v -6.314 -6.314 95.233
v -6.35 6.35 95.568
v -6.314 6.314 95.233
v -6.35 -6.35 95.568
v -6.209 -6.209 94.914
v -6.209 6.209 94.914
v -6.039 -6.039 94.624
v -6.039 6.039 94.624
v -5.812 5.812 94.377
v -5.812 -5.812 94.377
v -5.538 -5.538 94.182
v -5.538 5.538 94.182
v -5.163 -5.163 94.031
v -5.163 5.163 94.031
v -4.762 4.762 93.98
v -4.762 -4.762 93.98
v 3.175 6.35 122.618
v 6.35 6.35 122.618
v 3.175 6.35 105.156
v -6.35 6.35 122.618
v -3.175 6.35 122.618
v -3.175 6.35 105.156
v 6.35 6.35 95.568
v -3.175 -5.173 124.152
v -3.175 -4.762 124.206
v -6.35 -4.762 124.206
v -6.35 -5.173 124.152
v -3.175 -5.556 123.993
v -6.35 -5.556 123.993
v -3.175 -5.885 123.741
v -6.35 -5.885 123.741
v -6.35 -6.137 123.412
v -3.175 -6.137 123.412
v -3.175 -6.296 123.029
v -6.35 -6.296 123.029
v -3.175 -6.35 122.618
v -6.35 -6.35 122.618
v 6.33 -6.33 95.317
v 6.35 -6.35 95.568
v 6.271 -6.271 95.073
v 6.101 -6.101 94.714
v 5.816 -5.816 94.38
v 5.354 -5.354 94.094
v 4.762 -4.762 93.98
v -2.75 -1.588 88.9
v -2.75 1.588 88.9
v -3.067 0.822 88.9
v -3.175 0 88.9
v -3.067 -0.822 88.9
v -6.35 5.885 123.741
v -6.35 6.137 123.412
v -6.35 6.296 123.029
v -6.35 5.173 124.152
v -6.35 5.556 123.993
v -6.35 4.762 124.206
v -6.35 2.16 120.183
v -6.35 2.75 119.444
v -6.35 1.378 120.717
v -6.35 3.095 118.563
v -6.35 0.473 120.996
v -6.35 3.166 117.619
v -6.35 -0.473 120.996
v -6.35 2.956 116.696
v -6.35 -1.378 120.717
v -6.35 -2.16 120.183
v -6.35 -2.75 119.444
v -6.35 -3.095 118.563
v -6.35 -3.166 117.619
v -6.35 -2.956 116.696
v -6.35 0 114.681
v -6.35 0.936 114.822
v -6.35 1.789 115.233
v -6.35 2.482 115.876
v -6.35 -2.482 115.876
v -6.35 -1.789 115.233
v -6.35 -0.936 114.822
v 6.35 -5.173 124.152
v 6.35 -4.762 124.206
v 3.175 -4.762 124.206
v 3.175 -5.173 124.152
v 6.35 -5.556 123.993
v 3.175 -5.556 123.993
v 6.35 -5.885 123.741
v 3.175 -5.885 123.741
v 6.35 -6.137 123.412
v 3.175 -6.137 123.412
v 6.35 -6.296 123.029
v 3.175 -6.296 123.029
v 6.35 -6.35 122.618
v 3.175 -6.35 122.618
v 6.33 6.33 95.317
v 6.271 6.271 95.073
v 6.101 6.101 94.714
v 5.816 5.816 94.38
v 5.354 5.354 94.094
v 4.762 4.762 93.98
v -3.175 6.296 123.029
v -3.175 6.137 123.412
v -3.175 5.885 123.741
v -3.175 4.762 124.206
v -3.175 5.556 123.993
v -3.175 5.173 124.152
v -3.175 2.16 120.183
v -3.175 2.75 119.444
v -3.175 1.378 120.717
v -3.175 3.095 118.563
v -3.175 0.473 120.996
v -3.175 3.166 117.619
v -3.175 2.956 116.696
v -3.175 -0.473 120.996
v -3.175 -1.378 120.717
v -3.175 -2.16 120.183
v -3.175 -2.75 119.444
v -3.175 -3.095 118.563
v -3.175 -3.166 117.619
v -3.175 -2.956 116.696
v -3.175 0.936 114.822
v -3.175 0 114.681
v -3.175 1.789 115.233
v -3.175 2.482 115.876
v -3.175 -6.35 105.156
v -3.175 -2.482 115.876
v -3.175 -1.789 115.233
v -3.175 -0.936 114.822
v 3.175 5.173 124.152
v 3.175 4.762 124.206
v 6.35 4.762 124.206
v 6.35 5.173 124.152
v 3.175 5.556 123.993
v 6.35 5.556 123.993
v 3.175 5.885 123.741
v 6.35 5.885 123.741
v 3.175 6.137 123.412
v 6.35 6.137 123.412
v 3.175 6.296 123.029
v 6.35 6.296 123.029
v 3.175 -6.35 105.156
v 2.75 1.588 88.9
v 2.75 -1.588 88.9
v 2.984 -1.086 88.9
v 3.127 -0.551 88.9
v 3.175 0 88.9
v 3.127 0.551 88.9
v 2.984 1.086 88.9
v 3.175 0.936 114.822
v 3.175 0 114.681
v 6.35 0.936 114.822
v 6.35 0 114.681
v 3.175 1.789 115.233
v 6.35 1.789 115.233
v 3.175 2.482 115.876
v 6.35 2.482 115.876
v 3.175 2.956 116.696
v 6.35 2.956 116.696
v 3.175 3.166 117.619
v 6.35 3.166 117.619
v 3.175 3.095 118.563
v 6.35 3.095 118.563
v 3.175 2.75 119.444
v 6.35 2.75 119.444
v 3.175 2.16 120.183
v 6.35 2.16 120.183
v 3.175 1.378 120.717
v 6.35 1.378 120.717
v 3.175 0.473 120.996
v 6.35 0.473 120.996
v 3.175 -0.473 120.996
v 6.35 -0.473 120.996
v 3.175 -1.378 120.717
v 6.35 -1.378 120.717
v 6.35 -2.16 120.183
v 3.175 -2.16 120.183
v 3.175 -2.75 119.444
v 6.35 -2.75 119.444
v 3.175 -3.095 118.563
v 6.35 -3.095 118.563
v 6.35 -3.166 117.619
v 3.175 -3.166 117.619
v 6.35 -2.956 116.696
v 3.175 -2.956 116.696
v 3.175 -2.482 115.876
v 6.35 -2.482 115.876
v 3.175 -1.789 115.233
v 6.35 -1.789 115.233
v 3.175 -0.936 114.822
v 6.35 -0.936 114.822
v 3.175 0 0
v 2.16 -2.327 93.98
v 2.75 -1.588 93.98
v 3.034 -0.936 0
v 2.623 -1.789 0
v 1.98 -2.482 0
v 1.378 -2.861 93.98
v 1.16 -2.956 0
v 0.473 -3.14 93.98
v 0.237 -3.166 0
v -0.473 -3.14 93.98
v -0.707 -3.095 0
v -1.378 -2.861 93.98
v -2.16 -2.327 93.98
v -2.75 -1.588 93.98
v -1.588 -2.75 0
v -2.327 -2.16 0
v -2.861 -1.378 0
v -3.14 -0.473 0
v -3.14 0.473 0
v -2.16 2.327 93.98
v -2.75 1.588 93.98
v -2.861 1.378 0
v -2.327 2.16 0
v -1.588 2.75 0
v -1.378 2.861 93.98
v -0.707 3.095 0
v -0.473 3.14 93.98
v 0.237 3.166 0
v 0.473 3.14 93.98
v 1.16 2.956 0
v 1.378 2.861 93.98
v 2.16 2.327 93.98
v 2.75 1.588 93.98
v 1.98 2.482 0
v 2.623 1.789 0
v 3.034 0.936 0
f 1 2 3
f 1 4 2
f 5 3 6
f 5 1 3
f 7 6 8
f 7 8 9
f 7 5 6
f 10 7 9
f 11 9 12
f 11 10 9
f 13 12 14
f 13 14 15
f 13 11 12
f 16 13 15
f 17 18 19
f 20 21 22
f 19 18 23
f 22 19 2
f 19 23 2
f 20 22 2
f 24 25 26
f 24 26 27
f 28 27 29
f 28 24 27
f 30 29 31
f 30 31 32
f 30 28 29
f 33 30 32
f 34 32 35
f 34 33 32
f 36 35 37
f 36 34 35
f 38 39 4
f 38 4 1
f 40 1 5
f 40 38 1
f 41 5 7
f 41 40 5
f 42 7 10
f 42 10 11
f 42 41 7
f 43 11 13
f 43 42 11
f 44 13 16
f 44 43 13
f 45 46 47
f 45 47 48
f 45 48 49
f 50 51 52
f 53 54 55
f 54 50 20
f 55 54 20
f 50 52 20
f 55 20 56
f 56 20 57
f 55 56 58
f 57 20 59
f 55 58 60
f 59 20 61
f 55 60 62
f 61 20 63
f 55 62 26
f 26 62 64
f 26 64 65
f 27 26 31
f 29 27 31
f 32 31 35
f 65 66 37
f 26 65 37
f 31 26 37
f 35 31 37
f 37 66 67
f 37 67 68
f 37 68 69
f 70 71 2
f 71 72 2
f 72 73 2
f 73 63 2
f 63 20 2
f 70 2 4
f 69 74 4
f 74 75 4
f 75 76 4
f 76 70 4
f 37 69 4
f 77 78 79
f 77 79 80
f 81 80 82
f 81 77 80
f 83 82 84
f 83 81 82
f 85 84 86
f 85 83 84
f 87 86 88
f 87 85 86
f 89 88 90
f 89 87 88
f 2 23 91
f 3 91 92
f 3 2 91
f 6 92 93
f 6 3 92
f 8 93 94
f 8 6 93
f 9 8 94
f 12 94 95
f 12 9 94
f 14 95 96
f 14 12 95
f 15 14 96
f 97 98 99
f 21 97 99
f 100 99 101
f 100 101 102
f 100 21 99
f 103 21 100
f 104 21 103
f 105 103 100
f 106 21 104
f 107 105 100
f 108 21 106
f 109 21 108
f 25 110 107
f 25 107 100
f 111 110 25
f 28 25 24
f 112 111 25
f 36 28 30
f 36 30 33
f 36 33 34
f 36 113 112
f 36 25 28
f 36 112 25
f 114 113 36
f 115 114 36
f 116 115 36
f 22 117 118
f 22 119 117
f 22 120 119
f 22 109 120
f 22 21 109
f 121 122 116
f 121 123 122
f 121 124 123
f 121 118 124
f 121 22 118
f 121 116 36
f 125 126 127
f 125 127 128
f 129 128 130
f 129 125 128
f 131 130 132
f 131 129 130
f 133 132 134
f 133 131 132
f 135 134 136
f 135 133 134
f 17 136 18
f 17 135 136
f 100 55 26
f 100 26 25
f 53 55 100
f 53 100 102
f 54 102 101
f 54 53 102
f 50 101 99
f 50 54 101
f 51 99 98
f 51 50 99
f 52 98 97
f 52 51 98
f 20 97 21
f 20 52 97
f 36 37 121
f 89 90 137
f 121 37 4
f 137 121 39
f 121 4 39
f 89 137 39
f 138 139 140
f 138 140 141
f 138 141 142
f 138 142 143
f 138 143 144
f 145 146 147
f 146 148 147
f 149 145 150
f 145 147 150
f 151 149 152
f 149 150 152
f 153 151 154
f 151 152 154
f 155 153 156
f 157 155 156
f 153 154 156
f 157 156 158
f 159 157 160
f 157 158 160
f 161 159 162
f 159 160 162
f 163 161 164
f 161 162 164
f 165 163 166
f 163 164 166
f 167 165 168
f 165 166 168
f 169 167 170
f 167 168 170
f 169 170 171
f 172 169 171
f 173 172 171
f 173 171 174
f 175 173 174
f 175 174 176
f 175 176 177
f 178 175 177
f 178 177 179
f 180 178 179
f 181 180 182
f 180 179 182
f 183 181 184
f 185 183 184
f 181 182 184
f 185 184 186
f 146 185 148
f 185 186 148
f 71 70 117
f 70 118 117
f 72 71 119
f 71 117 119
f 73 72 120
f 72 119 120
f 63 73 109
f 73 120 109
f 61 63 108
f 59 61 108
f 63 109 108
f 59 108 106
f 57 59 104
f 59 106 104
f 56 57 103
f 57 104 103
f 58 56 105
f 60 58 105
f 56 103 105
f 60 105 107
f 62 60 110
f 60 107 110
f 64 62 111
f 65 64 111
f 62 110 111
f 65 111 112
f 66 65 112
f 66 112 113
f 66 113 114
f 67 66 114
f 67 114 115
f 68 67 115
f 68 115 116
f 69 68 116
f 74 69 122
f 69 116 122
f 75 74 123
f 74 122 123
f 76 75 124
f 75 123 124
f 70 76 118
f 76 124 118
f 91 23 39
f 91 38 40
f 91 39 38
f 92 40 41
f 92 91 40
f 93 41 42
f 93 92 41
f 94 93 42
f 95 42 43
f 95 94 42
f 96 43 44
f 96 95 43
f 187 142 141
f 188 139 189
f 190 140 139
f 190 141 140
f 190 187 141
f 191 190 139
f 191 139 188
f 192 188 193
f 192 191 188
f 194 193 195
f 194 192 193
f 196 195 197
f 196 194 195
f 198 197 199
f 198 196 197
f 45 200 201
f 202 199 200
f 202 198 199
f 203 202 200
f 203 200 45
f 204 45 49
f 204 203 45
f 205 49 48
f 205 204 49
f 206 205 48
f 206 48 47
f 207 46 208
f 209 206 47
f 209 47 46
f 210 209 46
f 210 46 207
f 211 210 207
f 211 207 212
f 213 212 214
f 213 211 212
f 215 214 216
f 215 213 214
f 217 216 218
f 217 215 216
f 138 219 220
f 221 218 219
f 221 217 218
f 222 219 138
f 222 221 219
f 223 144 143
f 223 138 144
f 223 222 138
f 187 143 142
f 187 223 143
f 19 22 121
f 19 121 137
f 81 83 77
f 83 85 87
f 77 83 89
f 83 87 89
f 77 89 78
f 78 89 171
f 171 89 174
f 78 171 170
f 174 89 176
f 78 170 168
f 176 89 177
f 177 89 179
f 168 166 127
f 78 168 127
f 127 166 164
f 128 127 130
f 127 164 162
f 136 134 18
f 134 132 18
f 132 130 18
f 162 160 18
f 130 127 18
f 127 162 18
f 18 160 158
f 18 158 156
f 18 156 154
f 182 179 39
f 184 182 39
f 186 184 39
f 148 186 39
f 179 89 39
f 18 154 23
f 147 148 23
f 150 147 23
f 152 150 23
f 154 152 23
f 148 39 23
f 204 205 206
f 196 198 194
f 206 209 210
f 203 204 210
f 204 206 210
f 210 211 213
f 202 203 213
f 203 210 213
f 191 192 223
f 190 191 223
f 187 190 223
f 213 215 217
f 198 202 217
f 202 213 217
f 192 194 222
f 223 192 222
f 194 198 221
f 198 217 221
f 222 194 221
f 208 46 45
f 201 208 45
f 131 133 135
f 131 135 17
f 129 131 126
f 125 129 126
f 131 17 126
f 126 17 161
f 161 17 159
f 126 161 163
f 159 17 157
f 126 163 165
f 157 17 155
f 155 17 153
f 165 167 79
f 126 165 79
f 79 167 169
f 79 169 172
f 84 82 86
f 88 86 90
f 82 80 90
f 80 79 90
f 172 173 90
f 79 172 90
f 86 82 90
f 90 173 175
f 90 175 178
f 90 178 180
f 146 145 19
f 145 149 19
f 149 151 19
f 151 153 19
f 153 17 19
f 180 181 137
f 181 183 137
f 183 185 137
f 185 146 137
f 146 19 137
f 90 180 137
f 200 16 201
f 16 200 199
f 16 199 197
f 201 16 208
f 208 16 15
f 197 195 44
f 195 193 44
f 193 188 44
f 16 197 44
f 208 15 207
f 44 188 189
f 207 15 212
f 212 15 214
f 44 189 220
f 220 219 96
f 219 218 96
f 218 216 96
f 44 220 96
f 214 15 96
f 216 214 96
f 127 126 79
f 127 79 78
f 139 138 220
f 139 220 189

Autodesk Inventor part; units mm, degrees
ref_plane "YZ Plane" through (0, 0, 0) normal (1, 0, 0) x (0, 1, 0)
ref_plane "XZ Plane" through (0, 0, 0) normal (0, 1, 0) x (-1, 0, 0)
ref_plane "XY Plane" through (0, 0, 0) normal (0, 0, 1) x (1, 0, 0)
sketch "Sketch1" plane through (0, 0, 0) normal (0, 0, 1) x (1, 0, 0)
  circle A0 centre (0, 0) radius 3.175
  dimension "d0" = 6.35
extrude "Extrusion1" add sketch "Sketch1" along normal blind 88.9
sketch "Sketch2" plane through (0, 0, 88.9) normal (0, 0, 1) x (1, 0, 0)
  circle A0 centre (0, 0) radius 3.175 projected
  arc A1 (2.7496, 1.5875) -> (-2.7496, 1.5875) centre (0, 0) ccw
  arc A2 (-2.7496, -1.5875) -> (2.7496, -1.5875) centre (0, 0) ccw
  line L0 (2.7496, 1.5875) -> (2.7496, -1.5875)
  line L1 (-2.7496, 1.5875) -> (-2.7496, -1.5875)
  line L2 (0, 3.175) -> (0, -3.175) construction
  dimension "d3" = 3.175
extrude "Extrusion2" add sketch "Sketch2" along normal blind 5.08 contours L0 A0 L1
sketch "Sketch3" plane through (0, 0, 93.98) normal (0, 0, 1) x (1, 0, 0)
  line L0 (-6.35, -6.35) -> (6.35, -6.35)
  line L1 (6.35, -6.35) -> (6.35, 6.35)
  line L2 (6.35, 6.35) -> (-6.35, 6.35)
  line L3 (-6.35, 6.35) -> (-6.35, -6.35)
  line L4 (-6.35, -6.35) -> (6.35, 6.35) construction
  line L5 (6.35, -6.35) -> (-6.35, 6.35) construction
  point P0 (0, 0)
  dimension "d6" = 12.7
extrude "Extrusion3" add sketch "Sketch3" along normal blind 11.176
sketch "Sketch4" plane through (0, 0, 105.156) normal (0, 0, 1) x (1, 0, 0)
  line L0 (6.35, 6.35) -> (-6.35, 6.35) projected
  line L1 (-6.35, -6.35) -> (6.35, -6.35) projected
  line L2 (6.35, 6.35) -> (3.175, 6.35)
  line L3 (3.175, 6.35) -> (3.175, -6.35)
  line L4 (3.175, -6.35) -> (6.35, -6.35)
  line L5 (6.35, -6.35) -> (6.35, 6.35)
  line L6 (-6.35, 6.35) -> (-3.175, 6.35)
  line L7 (-3.175, 6.35) -> (-3.175, -6.35)
  line L8 (-3.175, -6.35) -> (-6.35, -6.35)
  line L9 (-6.35, -6.35) -> (-6.35, 6.35)
  line L10 (3.175, 0) -> (-3.175, 0) construction
  point P0 (0, 0)
  point P1 (0, 0)
  dimension "d9" = 6.35
extrude "Extrusion4" add sketch "Sketch4" along normal blind 19.05 contours L5 L1 L3 L0 | L7 L1 L9 L0
sketch "Sketch5" plane through (6.35, -6.35, 93.98) normal (1, 0, 0) x (0, 0, -1)
  line L0 (-30.226, 12.7) -> (-30.226, 0) construction
  line L1 (-30.226, 6.35) -> (-23.876, 6.35) construction
  circle A0 centre (-23.876, 6.35) radius 3.175
  point P0 (93.98, 6.35)
  dimension "d12" = 6.35
  dimension "d13" = 6.35
extrude "Extrusion5" cut sketch "Sketch5" against normal through all
fillet "Fillet1" radius 1.5875 8 edges at (4.7625, 6.35, 124.206) (4.7625, -6.35, 124.206) (-4.7625, -6.35, 124.206) (-4.7625, 6.35, 124.206) (6.35, 0, 93.98) (0, 6.35, 93.98) (-6.35, 0, 93.98) (0, -6.35, 93.98)
properties part number "cylinder piston"
